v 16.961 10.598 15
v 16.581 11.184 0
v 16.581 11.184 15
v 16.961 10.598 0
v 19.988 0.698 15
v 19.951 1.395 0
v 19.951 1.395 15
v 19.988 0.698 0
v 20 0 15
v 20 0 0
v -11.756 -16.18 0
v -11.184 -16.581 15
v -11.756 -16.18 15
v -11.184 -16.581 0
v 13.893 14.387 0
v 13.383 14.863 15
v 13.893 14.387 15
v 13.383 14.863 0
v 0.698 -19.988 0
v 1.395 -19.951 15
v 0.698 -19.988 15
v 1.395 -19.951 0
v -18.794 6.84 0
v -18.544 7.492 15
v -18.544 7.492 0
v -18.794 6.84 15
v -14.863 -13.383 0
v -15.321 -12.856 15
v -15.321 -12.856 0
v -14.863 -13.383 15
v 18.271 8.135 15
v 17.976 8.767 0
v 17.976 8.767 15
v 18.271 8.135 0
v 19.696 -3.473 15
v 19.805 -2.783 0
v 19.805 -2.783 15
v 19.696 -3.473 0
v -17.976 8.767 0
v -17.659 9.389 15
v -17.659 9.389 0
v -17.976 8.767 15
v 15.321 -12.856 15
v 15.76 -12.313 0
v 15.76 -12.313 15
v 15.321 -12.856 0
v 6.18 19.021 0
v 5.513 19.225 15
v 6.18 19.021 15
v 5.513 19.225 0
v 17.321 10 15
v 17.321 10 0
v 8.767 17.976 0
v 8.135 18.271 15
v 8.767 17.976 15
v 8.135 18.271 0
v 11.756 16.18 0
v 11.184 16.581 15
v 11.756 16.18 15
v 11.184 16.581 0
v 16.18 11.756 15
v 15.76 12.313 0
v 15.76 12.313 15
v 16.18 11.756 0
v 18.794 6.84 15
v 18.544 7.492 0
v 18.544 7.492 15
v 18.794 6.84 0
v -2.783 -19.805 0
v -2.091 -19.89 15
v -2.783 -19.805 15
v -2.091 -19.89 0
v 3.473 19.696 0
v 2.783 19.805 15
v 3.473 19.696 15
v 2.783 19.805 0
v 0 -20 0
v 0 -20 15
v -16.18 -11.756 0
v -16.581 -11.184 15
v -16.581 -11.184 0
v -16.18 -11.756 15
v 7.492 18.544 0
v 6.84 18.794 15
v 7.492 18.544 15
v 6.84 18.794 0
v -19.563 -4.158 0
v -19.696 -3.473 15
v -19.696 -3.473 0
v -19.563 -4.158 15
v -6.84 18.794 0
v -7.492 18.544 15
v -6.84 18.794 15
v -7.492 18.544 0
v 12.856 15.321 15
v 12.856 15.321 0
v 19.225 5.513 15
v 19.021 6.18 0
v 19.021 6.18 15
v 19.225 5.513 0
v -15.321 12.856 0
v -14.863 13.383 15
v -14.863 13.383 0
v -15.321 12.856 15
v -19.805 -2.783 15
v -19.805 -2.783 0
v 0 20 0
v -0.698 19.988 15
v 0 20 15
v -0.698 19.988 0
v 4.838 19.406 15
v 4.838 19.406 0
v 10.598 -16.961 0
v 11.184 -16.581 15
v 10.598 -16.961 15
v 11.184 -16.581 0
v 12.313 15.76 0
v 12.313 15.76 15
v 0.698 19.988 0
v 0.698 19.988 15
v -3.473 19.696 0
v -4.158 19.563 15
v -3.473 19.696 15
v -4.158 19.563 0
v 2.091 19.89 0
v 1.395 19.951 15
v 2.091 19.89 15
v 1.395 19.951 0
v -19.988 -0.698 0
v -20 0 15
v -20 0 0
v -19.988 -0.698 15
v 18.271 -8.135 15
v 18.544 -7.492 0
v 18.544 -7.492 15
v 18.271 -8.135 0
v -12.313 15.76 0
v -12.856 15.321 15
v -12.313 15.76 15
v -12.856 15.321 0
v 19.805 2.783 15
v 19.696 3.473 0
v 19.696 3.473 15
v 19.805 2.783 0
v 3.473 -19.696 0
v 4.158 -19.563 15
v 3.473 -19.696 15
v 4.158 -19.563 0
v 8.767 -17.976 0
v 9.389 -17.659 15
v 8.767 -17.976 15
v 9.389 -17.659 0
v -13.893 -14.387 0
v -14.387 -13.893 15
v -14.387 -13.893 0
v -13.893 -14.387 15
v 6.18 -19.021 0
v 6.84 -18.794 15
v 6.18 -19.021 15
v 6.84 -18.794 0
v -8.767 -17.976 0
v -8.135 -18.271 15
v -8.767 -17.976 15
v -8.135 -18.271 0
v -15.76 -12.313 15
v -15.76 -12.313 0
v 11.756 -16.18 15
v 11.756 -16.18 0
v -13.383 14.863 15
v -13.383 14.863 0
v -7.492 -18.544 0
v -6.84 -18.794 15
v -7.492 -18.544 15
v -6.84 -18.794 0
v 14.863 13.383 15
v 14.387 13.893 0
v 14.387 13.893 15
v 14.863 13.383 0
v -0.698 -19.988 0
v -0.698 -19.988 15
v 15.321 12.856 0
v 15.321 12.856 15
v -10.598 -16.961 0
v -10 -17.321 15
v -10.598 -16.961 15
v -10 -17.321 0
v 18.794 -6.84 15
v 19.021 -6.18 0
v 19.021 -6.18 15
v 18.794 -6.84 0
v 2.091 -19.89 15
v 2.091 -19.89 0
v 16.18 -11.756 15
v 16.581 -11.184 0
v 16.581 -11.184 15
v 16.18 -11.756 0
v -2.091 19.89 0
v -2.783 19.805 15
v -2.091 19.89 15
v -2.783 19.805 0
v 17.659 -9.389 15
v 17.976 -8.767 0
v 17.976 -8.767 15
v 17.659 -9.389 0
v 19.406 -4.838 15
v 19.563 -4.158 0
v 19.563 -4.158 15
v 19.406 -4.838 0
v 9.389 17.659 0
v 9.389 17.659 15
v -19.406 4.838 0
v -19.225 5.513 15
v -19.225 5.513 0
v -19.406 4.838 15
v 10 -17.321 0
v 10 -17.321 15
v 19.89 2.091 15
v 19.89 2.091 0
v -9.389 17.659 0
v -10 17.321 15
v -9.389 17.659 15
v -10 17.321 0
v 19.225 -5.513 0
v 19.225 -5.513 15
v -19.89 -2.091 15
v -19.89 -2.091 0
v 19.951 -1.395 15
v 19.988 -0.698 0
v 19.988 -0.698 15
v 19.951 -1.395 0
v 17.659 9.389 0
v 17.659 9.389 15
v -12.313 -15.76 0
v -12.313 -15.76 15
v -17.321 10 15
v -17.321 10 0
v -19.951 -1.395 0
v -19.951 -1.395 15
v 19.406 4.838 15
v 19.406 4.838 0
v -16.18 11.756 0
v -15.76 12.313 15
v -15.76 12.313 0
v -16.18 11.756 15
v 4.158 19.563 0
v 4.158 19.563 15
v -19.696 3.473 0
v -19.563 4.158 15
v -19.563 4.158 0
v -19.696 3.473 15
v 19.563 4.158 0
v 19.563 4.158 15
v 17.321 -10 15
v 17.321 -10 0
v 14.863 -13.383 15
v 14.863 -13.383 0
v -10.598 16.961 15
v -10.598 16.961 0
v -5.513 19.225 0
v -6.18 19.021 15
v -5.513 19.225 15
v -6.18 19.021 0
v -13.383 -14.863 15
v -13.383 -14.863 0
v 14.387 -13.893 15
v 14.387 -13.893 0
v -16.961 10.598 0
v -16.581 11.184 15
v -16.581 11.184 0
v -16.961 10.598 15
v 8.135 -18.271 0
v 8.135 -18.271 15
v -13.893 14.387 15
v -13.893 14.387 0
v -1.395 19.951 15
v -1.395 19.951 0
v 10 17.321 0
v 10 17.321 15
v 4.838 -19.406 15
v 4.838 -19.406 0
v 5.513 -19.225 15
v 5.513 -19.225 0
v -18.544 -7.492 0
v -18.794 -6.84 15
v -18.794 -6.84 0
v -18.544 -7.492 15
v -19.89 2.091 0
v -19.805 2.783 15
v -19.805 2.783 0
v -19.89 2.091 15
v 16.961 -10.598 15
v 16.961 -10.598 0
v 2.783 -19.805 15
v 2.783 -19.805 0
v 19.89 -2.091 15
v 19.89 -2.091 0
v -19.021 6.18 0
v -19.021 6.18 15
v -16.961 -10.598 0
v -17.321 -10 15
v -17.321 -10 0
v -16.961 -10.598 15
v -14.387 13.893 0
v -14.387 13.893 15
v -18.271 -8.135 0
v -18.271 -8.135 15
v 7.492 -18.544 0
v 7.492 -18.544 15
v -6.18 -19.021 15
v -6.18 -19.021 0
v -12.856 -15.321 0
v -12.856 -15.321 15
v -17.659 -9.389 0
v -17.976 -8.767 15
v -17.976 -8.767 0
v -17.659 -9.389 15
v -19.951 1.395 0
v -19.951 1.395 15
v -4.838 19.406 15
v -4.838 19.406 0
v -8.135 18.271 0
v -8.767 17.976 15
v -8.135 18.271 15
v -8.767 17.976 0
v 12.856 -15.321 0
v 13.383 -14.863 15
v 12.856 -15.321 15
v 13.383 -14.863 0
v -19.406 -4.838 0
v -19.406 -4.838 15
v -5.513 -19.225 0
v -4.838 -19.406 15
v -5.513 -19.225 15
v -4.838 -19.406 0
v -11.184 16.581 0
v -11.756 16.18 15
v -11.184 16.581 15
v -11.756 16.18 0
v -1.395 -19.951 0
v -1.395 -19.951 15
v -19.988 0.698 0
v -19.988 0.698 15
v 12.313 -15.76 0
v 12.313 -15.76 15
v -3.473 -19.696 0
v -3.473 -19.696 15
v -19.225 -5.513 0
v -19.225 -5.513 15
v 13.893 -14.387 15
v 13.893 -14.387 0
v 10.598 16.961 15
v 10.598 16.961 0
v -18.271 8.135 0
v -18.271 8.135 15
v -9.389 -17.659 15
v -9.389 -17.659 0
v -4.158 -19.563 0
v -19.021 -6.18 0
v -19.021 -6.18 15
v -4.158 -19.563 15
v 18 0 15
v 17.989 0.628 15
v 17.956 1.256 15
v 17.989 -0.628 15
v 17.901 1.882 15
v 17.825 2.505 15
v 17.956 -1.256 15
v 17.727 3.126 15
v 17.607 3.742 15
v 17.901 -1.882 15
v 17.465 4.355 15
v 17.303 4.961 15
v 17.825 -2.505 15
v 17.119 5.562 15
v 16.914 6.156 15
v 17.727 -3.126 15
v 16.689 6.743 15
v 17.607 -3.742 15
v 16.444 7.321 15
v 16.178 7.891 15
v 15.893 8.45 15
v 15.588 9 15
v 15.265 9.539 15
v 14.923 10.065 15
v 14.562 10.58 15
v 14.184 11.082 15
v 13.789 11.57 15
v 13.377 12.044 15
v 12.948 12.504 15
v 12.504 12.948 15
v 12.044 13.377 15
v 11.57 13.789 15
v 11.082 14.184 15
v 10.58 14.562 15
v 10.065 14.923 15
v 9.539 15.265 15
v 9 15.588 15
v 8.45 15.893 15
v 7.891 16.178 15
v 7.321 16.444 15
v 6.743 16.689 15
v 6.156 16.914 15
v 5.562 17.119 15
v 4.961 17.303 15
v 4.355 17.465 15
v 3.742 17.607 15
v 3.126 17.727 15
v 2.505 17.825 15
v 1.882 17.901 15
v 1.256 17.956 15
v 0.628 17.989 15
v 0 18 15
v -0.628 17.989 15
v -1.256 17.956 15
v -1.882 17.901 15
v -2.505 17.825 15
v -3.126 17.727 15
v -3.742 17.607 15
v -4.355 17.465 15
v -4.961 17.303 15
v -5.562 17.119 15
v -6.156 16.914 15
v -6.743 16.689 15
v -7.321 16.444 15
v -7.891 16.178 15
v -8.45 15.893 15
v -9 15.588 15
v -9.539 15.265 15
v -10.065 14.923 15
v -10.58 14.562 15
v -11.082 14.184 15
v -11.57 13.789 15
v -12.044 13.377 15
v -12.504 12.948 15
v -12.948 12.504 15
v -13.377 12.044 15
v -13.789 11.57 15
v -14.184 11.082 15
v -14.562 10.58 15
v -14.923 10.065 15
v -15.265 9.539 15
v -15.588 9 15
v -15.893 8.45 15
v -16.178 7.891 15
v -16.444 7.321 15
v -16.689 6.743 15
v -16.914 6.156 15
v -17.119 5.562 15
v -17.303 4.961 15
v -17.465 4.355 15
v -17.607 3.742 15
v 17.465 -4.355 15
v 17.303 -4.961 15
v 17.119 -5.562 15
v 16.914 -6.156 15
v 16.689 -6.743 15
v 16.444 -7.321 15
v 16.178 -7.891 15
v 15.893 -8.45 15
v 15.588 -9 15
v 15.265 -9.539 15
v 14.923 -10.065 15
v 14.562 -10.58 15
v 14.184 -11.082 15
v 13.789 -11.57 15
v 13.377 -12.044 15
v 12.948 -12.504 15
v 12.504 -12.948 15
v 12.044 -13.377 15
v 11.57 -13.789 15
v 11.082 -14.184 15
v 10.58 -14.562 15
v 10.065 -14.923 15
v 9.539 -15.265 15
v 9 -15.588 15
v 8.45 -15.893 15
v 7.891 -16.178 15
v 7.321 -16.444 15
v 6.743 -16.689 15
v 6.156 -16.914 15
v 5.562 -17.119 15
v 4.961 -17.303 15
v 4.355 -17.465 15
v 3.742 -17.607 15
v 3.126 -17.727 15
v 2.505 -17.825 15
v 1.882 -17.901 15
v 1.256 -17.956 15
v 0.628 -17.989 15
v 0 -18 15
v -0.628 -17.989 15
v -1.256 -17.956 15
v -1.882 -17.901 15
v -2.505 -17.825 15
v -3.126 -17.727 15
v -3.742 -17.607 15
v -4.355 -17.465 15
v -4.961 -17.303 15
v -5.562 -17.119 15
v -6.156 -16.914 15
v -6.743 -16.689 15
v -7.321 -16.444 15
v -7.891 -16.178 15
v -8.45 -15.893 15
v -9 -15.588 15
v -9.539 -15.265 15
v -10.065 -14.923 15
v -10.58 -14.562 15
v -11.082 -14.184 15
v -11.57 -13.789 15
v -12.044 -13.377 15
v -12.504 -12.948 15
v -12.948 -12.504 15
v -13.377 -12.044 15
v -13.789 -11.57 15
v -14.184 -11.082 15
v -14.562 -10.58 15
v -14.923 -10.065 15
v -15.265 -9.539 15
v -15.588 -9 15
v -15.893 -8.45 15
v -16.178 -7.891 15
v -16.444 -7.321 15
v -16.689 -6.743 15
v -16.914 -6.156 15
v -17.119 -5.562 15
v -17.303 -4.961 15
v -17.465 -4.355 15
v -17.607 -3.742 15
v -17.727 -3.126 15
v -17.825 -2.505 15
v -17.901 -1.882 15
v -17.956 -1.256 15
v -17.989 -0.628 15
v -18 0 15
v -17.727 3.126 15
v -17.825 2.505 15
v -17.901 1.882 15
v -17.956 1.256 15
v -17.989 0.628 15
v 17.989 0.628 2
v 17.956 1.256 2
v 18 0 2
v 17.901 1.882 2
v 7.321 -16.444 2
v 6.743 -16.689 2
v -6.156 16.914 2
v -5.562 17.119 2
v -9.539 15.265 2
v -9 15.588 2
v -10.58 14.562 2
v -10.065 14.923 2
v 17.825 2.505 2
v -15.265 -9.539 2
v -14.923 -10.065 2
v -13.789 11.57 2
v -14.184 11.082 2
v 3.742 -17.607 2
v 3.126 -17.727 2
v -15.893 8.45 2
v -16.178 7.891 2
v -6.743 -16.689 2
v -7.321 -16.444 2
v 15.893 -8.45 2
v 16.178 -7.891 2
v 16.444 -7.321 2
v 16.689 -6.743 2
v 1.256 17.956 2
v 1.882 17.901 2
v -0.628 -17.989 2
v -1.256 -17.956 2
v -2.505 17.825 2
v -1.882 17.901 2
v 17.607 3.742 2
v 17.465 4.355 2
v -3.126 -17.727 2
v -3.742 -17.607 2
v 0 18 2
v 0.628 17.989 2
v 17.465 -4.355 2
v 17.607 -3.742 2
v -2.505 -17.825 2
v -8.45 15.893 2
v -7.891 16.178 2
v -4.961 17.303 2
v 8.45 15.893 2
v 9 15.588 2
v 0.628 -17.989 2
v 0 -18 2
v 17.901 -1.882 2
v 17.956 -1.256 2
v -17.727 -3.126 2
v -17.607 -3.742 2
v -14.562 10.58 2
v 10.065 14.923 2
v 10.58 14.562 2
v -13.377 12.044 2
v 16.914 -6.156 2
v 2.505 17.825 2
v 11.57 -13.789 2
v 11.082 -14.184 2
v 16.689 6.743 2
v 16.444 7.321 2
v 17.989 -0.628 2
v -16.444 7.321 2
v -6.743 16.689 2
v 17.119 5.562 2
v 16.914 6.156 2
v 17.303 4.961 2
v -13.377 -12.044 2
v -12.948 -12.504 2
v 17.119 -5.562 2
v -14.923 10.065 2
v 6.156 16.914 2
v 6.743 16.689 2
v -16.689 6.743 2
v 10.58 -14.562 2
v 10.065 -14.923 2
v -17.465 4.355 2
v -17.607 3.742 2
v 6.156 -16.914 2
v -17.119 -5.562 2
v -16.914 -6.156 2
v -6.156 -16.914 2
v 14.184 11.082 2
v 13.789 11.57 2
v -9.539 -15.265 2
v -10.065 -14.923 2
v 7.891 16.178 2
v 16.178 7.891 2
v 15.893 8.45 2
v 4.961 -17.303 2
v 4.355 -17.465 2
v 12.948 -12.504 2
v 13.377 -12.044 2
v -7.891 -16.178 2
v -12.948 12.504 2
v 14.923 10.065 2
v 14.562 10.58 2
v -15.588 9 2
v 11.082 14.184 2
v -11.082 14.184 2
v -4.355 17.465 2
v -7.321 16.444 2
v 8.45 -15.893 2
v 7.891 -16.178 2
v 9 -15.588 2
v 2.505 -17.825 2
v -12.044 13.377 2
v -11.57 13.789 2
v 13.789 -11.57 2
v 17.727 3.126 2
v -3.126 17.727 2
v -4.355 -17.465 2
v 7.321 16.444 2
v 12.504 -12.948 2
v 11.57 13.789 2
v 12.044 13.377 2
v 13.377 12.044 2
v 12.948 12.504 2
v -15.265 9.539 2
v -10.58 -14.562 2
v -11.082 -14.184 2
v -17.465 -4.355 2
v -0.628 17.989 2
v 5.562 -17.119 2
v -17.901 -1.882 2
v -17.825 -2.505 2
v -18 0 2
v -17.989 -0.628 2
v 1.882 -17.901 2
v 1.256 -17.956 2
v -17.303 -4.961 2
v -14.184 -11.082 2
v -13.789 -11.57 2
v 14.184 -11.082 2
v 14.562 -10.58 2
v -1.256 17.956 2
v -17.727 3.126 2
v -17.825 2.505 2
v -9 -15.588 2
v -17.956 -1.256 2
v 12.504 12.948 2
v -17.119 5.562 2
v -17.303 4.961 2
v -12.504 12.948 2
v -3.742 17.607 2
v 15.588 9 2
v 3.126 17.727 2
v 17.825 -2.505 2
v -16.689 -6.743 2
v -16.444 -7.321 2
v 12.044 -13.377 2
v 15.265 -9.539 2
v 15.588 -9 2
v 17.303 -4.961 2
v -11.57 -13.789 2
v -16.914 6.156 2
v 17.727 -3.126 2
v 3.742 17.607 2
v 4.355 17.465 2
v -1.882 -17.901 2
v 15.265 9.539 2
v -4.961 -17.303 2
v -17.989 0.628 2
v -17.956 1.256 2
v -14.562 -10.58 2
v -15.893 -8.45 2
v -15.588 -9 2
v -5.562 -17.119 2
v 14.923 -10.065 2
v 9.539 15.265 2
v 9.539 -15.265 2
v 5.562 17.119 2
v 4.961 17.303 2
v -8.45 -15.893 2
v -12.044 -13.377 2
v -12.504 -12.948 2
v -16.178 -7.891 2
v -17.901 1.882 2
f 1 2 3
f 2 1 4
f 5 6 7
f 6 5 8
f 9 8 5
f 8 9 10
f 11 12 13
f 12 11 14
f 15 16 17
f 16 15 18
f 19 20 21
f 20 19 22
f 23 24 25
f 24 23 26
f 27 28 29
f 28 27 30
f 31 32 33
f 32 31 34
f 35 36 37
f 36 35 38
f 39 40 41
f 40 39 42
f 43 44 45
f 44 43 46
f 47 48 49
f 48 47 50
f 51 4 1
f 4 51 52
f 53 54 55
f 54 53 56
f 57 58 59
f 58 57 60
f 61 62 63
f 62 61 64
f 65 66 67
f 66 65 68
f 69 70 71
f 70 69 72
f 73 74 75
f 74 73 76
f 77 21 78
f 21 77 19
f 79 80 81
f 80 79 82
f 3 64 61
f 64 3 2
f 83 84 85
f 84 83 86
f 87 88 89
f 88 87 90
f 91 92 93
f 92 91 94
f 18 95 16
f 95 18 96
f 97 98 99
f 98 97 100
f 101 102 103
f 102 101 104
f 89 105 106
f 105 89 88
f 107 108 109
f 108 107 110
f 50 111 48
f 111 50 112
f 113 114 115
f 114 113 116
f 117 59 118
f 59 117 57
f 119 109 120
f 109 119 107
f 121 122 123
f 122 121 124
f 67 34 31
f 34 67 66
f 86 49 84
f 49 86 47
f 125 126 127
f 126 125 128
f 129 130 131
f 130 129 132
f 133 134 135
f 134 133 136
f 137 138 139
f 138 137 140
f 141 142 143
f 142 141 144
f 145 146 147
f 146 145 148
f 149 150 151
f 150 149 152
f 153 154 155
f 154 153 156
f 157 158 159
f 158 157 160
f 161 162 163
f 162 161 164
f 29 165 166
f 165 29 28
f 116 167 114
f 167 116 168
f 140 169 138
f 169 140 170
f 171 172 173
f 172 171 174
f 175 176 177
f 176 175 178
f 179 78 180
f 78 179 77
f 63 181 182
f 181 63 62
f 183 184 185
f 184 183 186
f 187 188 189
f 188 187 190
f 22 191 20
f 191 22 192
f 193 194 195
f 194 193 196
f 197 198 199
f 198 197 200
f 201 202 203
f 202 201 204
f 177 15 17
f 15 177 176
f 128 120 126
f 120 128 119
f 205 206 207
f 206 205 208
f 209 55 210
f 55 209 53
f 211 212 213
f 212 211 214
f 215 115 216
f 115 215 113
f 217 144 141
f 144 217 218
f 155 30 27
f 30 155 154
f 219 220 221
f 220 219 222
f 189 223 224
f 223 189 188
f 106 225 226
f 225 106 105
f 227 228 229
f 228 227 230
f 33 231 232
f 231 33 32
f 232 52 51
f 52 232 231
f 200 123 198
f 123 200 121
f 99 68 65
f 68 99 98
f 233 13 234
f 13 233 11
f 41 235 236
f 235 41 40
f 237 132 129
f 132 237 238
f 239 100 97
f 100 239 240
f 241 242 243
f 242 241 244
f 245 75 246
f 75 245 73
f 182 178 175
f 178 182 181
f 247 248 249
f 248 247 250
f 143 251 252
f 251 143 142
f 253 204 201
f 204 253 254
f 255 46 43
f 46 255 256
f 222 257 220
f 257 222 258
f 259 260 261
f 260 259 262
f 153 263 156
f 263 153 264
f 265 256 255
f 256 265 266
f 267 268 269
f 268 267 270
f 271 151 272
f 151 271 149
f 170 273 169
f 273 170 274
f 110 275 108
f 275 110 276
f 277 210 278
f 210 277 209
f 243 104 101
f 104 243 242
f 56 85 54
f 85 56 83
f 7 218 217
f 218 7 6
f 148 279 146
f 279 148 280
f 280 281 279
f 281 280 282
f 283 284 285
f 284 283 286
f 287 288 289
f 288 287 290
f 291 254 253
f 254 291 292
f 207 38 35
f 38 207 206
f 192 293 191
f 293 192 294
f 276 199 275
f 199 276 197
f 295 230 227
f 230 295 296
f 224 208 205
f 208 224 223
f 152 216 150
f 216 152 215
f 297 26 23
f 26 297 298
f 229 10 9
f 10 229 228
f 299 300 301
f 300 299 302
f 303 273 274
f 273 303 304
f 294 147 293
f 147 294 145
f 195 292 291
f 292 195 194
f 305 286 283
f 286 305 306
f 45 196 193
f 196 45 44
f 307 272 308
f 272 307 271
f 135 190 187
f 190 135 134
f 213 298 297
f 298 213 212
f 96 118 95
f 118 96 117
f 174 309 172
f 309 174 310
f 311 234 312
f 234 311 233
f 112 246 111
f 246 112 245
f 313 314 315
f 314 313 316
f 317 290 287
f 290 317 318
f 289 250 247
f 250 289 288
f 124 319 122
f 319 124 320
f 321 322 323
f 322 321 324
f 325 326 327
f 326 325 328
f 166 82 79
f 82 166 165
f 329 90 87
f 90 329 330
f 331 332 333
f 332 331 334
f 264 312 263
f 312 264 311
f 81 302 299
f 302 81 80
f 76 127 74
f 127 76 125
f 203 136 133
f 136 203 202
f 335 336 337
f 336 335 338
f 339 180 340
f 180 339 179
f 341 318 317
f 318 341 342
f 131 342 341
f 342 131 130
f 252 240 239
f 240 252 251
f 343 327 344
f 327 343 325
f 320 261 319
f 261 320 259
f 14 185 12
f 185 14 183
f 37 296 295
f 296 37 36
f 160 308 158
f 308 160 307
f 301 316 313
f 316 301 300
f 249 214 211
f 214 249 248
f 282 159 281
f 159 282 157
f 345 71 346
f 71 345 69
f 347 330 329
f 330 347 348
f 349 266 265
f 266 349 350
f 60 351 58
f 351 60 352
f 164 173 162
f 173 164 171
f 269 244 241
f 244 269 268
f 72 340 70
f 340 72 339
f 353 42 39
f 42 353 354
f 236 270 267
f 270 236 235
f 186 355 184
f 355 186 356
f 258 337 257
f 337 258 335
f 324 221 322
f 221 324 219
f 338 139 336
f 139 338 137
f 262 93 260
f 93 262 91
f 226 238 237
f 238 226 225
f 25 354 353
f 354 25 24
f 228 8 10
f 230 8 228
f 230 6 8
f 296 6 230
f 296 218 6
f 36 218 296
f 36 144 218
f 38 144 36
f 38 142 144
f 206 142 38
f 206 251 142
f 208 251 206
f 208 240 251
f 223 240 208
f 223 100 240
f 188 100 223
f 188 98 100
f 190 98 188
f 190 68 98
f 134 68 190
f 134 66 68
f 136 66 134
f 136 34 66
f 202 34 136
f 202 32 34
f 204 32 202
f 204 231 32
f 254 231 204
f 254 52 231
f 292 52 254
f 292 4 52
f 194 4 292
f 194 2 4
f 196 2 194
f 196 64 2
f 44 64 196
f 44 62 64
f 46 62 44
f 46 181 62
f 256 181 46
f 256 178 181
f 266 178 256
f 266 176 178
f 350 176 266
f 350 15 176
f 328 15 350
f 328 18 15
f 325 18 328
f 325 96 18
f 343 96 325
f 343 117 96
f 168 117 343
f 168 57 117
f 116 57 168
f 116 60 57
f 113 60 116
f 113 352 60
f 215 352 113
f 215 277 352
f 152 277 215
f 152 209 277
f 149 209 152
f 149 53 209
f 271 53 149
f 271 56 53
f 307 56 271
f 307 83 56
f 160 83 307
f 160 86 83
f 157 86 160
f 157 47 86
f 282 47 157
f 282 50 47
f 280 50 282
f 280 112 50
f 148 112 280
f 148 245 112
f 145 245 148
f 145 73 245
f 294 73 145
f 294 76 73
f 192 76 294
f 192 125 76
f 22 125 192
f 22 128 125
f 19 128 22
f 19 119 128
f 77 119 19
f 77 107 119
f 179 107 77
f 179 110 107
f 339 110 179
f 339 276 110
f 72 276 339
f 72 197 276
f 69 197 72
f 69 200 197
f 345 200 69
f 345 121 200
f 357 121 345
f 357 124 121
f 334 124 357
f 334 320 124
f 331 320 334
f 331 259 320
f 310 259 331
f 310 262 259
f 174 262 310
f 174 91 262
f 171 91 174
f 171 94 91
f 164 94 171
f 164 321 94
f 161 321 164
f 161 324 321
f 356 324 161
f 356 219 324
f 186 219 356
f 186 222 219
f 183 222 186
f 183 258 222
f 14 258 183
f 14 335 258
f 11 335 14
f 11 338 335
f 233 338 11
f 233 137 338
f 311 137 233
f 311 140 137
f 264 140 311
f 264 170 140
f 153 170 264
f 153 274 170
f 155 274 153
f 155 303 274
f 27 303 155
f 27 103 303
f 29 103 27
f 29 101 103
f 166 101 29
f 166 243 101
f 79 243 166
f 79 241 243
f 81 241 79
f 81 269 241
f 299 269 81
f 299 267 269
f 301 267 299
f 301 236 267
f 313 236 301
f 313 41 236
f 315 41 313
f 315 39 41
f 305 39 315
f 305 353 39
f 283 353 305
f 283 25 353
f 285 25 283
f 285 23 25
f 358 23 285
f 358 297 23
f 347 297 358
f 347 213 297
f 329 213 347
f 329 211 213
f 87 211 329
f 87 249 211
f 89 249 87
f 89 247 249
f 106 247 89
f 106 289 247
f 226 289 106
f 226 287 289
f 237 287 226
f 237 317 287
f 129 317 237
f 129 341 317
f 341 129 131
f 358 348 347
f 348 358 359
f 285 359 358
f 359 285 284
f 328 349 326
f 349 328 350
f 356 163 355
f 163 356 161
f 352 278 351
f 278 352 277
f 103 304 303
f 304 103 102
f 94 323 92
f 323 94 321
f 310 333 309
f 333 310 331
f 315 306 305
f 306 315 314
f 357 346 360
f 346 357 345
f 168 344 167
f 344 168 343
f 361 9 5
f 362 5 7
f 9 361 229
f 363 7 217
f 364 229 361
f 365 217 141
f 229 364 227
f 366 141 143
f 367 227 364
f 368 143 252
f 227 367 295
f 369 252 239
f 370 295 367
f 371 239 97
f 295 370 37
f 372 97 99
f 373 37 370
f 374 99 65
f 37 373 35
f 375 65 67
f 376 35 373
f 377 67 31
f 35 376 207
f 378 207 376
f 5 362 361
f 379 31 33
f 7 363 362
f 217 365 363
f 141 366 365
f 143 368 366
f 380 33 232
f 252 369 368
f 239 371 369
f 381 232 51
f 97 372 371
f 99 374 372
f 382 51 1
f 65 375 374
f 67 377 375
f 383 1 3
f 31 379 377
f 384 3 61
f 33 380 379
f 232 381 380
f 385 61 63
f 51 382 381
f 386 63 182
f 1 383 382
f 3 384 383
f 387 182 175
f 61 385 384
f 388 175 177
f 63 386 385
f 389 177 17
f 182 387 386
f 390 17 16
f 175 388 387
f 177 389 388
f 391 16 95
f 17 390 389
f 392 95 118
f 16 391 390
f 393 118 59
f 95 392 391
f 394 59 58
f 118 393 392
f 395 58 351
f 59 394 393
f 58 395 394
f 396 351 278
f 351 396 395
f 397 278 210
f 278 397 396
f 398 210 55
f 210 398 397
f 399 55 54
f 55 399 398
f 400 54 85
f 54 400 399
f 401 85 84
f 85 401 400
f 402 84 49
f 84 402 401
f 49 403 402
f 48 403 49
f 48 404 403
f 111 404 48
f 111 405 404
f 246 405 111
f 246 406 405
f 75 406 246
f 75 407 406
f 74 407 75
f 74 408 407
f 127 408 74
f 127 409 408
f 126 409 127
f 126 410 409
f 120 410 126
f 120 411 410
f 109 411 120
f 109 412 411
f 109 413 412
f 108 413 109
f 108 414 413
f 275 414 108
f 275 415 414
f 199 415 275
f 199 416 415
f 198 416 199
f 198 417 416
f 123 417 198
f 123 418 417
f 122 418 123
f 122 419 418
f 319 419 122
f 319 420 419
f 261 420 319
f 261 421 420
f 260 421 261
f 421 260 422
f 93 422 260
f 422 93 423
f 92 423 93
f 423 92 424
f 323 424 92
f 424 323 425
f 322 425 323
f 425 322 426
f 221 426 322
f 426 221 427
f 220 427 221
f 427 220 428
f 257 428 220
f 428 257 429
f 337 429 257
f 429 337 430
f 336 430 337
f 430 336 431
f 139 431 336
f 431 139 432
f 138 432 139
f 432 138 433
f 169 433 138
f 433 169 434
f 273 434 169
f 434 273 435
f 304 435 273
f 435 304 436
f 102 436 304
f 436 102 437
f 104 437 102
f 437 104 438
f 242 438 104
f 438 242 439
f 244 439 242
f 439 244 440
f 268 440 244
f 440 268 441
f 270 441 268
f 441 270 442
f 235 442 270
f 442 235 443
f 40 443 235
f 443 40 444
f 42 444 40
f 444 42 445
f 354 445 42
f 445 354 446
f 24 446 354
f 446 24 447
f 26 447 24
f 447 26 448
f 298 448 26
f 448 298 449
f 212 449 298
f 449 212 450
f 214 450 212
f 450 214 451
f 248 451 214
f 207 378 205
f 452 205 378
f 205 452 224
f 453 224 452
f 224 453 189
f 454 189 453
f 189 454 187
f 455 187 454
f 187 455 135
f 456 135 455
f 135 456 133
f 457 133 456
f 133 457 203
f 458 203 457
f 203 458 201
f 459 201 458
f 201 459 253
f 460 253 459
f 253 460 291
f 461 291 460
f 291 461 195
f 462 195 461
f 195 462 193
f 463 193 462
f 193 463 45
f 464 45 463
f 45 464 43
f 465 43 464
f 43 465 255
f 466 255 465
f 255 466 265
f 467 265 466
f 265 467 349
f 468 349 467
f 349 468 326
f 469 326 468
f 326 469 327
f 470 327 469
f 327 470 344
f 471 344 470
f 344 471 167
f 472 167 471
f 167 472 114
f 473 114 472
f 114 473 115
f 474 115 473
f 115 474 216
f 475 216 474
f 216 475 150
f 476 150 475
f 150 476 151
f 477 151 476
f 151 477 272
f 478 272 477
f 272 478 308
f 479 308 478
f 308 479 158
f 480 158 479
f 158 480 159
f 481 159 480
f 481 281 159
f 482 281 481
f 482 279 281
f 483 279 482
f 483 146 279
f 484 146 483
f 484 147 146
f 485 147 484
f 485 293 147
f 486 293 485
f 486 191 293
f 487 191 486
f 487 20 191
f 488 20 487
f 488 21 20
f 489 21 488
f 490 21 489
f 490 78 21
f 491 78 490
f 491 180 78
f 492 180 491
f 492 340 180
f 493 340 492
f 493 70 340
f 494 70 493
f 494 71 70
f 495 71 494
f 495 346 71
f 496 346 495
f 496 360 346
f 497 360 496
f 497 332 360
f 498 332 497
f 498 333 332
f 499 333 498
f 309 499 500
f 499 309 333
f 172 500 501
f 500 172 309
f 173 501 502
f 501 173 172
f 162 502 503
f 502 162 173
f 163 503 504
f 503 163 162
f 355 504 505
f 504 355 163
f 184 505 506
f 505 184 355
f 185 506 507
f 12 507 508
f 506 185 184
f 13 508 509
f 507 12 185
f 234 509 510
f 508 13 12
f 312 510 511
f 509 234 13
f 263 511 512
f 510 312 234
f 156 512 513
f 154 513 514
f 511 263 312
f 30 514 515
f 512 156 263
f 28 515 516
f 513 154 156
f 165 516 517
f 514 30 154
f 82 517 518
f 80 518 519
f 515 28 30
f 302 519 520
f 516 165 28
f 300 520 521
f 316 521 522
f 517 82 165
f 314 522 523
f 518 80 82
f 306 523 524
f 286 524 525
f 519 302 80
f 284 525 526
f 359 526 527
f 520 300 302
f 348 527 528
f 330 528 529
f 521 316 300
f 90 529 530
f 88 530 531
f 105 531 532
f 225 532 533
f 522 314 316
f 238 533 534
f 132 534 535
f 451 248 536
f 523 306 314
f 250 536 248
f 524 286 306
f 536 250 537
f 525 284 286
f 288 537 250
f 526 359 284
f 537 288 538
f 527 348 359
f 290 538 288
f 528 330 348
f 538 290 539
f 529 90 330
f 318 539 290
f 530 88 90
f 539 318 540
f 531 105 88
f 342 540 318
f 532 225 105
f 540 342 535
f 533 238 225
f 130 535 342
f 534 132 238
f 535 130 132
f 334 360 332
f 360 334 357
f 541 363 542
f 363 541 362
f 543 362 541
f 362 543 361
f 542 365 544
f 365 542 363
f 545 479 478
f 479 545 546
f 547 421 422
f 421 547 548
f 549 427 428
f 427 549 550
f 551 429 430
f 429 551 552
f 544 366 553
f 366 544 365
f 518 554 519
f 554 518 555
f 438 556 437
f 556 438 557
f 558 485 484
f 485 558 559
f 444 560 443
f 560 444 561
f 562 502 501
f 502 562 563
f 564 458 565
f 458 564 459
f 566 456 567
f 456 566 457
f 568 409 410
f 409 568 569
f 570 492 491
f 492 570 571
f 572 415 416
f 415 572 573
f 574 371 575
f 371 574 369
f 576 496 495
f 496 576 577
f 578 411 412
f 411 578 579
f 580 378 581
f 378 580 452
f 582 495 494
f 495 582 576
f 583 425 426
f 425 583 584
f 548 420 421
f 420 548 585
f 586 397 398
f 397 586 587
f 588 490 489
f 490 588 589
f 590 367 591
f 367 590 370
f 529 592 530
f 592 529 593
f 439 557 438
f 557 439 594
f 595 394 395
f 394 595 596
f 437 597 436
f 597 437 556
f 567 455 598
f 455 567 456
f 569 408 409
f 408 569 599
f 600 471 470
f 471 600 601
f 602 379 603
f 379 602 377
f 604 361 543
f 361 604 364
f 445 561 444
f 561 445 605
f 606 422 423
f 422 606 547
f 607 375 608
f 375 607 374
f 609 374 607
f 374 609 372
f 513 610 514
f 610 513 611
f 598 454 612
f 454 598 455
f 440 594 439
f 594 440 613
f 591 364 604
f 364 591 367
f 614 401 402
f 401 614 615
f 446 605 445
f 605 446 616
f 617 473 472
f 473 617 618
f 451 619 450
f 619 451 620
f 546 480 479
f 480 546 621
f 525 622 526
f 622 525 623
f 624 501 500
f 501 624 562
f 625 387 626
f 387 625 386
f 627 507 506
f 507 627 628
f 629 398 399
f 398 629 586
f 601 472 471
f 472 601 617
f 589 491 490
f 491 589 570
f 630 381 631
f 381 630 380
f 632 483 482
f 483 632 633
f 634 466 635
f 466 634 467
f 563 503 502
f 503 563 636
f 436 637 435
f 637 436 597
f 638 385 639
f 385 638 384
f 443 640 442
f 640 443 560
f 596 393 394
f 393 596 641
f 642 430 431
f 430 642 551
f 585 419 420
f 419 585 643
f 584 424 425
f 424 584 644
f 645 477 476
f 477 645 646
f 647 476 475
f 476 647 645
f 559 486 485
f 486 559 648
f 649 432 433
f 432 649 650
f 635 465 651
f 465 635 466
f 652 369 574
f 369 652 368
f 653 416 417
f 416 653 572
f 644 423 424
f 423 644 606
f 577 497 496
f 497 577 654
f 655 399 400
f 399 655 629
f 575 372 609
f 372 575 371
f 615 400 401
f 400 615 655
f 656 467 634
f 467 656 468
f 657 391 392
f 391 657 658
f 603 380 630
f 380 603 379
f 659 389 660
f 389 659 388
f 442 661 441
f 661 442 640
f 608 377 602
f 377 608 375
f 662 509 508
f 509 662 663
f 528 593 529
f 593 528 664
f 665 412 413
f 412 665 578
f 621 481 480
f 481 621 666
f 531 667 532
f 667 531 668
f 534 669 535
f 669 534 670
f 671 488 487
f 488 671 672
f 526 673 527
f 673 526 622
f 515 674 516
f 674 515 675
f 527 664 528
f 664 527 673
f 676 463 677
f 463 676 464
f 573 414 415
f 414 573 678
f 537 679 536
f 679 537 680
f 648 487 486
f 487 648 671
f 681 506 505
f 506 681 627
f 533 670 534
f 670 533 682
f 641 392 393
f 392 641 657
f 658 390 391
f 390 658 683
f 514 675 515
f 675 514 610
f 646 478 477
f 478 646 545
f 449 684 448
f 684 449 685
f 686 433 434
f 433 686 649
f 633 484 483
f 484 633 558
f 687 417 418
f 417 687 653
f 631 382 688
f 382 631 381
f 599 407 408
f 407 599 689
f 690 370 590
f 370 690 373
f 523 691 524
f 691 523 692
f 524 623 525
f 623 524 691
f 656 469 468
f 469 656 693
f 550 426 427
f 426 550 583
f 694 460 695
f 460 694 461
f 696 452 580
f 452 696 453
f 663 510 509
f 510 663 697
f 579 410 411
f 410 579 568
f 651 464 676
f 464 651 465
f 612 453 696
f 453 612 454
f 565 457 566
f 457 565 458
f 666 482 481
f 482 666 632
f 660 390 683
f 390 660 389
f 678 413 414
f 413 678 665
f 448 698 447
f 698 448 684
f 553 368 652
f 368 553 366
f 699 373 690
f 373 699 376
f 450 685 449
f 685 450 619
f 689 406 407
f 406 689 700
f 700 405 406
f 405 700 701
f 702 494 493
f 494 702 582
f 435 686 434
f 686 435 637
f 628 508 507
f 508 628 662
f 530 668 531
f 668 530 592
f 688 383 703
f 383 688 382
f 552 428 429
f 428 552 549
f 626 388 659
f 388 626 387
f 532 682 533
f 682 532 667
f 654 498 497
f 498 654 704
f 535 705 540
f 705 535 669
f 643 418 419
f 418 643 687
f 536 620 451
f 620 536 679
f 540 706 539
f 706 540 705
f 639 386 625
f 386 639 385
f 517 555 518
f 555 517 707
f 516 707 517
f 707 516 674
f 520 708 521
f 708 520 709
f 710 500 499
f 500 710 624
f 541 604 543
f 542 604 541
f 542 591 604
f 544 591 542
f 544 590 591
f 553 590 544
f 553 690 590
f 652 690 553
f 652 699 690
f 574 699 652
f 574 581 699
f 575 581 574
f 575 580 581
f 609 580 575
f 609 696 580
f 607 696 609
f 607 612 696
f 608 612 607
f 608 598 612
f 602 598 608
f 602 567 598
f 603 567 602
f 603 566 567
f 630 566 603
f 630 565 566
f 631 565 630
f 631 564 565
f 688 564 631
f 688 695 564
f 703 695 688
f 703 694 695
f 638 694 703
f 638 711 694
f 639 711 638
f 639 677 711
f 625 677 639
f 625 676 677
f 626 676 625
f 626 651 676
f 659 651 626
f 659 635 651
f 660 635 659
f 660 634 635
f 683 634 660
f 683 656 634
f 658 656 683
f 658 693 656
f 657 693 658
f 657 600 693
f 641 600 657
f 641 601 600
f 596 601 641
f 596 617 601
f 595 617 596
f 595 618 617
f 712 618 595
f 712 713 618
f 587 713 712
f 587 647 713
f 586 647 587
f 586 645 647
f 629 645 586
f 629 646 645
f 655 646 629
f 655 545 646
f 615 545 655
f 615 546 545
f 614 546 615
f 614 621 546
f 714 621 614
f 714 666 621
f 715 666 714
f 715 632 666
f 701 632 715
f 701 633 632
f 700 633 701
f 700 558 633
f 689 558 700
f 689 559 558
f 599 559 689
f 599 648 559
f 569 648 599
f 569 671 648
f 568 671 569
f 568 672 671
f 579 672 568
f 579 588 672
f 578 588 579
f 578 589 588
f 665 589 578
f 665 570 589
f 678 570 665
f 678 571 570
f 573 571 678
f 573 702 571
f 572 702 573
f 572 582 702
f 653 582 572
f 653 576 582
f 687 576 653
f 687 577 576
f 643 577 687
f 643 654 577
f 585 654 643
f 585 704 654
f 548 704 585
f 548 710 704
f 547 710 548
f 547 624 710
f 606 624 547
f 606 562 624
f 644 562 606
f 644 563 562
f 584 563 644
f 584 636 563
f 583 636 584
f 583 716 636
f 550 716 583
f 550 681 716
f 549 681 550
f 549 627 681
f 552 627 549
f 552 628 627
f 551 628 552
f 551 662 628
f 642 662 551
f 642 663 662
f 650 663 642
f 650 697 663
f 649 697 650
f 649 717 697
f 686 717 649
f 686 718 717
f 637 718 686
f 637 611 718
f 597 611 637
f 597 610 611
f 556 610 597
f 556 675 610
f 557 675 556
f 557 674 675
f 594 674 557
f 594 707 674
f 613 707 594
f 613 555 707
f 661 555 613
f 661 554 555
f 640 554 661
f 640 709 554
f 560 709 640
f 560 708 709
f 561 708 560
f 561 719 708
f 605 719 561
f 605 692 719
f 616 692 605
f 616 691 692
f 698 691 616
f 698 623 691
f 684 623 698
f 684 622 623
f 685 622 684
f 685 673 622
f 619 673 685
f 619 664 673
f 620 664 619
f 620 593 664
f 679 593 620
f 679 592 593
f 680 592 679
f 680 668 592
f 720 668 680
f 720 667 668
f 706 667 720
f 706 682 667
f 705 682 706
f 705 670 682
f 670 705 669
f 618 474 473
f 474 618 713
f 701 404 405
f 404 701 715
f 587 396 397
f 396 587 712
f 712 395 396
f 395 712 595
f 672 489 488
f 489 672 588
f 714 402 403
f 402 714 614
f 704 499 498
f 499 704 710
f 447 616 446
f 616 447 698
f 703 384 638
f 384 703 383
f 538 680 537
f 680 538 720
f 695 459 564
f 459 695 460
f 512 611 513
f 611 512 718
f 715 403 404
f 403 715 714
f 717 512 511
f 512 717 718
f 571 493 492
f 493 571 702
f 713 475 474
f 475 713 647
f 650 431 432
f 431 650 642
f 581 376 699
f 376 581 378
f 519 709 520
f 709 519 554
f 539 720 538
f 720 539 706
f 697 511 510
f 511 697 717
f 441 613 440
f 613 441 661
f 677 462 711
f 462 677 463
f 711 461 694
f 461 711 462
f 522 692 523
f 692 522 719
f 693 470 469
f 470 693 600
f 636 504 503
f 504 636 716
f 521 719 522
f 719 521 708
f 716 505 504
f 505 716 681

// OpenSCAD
pad = 0.1;	// Padding to maintain manifold
ch = 15;
cr = 20;
ct = 2;
r = 4;
smooth = 180;	// Number of facets of rounding cylinder

difference() {
	cylinder(ch,cr,cr,center=false,$fn=smooth);
	translate([0,0,ct])
	cylinder(ch-ct+pad,cr-ct,cr-ct,center=false,$fn=smooth);
}
